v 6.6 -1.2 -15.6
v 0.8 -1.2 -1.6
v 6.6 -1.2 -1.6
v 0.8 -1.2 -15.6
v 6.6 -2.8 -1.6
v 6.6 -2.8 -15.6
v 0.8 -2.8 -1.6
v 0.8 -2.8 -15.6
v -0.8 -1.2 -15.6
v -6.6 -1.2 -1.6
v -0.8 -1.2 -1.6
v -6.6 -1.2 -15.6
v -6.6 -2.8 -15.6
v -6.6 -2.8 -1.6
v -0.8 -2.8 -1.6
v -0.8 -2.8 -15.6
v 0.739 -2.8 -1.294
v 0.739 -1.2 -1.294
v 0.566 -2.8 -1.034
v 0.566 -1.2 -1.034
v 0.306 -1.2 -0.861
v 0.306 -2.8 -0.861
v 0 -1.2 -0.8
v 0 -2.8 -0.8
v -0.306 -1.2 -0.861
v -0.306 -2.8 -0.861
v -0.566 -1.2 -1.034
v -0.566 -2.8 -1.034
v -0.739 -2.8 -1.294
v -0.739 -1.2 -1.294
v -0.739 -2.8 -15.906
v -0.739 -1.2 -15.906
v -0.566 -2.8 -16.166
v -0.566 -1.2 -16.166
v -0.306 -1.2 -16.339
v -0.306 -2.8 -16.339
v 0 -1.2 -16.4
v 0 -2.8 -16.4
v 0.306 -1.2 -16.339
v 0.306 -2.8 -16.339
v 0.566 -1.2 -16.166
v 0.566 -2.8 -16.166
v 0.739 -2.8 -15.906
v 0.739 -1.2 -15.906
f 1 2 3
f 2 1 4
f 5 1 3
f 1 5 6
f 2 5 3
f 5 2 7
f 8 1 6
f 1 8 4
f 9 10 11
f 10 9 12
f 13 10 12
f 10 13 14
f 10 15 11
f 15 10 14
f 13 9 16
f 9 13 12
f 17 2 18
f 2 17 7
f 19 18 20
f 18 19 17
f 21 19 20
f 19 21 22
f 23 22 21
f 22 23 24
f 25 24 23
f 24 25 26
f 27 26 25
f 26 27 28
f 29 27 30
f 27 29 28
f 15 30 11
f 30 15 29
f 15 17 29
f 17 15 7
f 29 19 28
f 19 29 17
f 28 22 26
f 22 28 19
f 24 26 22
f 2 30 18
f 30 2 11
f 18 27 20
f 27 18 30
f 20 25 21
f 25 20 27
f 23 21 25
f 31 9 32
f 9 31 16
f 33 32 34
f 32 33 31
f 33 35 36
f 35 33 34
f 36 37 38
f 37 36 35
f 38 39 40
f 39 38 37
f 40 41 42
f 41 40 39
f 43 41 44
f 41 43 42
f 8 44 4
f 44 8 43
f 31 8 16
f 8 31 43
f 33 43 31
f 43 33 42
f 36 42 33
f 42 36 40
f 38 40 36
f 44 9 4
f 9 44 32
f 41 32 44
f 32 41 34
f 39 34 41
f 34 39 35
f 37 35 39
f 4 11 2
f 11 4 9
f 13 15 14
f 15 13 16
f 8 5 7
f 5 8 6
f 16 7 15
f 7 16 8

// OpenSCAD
// file: ../p/4-4edge.scad
use <../lib.scad>
$fa=1; $fs=0.2;
function ldraw_lib__4_4edge(realsolid=false) = [
// 0 Circle 1.0
// 0 Name: 4-4edge.dat
// 0 Author: James Jessiman
// 0 !LDRAW_ORG Primitive UPDATE 2017-01
// 0 !LICENSE Licensed under CC BY 2.0 and CC BY 4.0 : see CAreadme.txt
// 
// 0 BFC CERTIFY CCW
  [0,"BFC","CERTIFY"],
  [0,"BFC","CCW"],
// 
// 0 !HISTORY 1998-12-15 [PTadmin] Official Update 1998-10
// 0 !HISTORY 2005-12-28 [PTadmin] Official Update 2005-01
// 0 !HISTORY 2007-06-24 [PTadmin] Header formatted for Contributor Agreement
// 0 !HISTORY 2008-07-01 [PTadmin] Official Update 2008-01
// 0 !HISTORY 2017-01-15 [Steffen] BFCed
// 0 !HISTORY 2017-12-30 [PTadmin] Official Update 2017-01
// 
// 
// 2 24 1 0 0 0.9239 0 0.3827
  [2,24,1,0,0,0.9239,0,0.3827],
// 2 24 0.9239 0 0.3827 0.7071 0 0.7071
  [2,24,0.9239,0,0.3827,0.7071,0,0.7071],
// 2 24 0.7071 0 0.7071 0.3827 0 0.9239
  [2,24,0.7071,0,0.7071,0.3827,0,0.9239],
// 2 24 0.3827 0 0.9239 0 0 1
  [2,24,0.3827,0,0.9239,0,0,1],
// 2 24 0 0 1 -0.3827 0 0.9239
  [2,24,0,0,1,-0.3827,0,0.9239],
// 2 24 -0.3827 0 0.9239 -0.7071 0 0.7071
  [2,24,-0.3827,0,0.9239,-0.7071,0,0.7071],
// 2 24 -0.7071 0 0.7071 -0.9239 0 0.3827
  [2,24,-0.7071,0,0.7071,-0.9239,0,0.3827],
// 2 24 -0.9239 0 0.3827 -1 0 -0
  [2,24,-0.9239,0,0.3827,-1,0,-0],
// 2 24 -1 0 -0 -0.9239 0 -0.3827
  [2,24,-1,0,-0,-0.9239,0,-0.3827],
// 2 24 -0.9239 0 -0.3827 -0.7071 0 -0.7071
  [2,24,-0.9239,0,-0.3827,-0.7071,0,-0.7071],
// 2 24 -0.7071 0 -0.7071 -0.3827 0 -0.9239
  [2,24,-0.7071,0,-0.7071,-0.3827,0,-0.9239],
// 2 24 -0.3827 0 -0.9239 0 0 -1
  [2,24,-0.3827,0,-0.9239,0,0,-1],
// 2 24 0 0 -1 0.3827 0 -0.9239
  [2,24,0,0,-1,0.3827,0,-0.9239],
// 2 24 0.3827 0 -0.9239 0.7071 0 -0.7071
  [2,24,0.3827,0,-0.9239,0.7071,0,-0.7071],
// 2 24 0.7071 0 -0.7071 0.9239 0 -0.3827
  [2,24,0.7071,0,-0.7071,0.9239,0,-0.3827],
// 2 24 0.9239 0 -0.3827 1 0 0
  [2,24,0.9239,0,-0.3827,1,0,0],
];
module ldraw_lib__4_4edge(step=0, col=false, unit=2/5, alt=false, line=0.2, solid=!$preview)
    makepoly(ldraw_lib__4_4edge(solid), step=step, col=col, unit=unit, alt=alt, line=line, solid=solid);
ldraw_lib__4_4edge(line=0.2);
// file: ../p/4-4disc.scad
use <../lib.scad>
$fa=1; $fs=0.2;
function ldraw_lib__4_4disc(realsolid=false) = [
// 0 Disc 1.0
// 0 Name: 4-4disc.dat
// 0 Author: James Jessiman
// 0 !LDRAW_ORG Primitive UPDATE 2002-02
// 0 !LICENSE Licensed under CC BY 2.0 and CC BY 4.0 : see CAreadme.txt
// 
// 0 BFC CERTIFY CCW
  [0,"BFC","CERTIFY"],
  [0,"BFC","CCW"],
// 
// 0 !HISTORY 1998-12-15 [PTadmin] Official Update 1998-10
// 0 !HISTORY 2002-03-23 [sbliss] Added BFC statement
// 0 !HISTORY 2002-04-25 [PTadmin] Official Update 2002-02
// 0 !HISTORY 2007-06-24 [PTadmin] Header formatted for Contributor Agreement
// 0 !HISTORY 2008-07-01 [PTadmin] Official Update 2008-01
// 
// 
// 3 16 0 0 0 1 0 0 0.9239 0 0.3827
  [3,16,0,0,0,1,0,0,0.9239,0,0.3827],
// 3 16 0 0 0 0.9239 0 0.3827 0.7071 0 0.7071
  [3,16,0,0,0,0.9239,0,0.3827,0.7071,0,0.7071],
// 3 16 0 0 0 0.7071 0 0.7071 0.3827 0 0.9239
  [3,16,0,0,0,0.7071,0,0.7071,0.3827,0,0.9239],
// 3 16 0 0 0 0.3827 0 0.9239 0 0 1
  [3,16,0,0,0,0.3827,0,0.9239,0,0,1],
// 3 16 0 0 0 0 0 1 -0.3827 0 0.9239
  [3,16,0,0,0,0,0,1,-0.3827,0,0.9239],
// 3 16 0 0 0 -0.3827 0 0.9239 -0.7071 0 0.7071
  [3,16,0,0,0,-0.3827,0,0.9239,-0.7071,0,0.7071],
// 3 16 0 0 0 -0.7071 0 0.7071 -0.9239 0 0.3827
  [3,16,0,0,0,-0.7071,0,0.7071,-0.9239,0,0.3827],
// 3 16 0 0 0 -0.9239 0 0.3827 -1 0 -0
  [3,16,0,0,0,-0.9239,0,0.3827,-1,0,-0],
// 3 16 0 0 0 -1 0 -0 -0.9239 0 -0.3827
  [3,16,0,0,0,-1,0,-0,-0.9239,0,-0.3827],
// 3 16 0 0 0 -0.9239 0 -0.3827 -0.7071 0 -0.7071
  [3,16,0,0,0,-0.9239,0,-0.3827,-0.7071,0,-0.7071],
// 3 16 0 0 0 -0.7071 0 -0.7071 -0.3827 0 -0.9239
  [3,16,0,0,0,-0.7071,0,-0.7071,-0.3827,0,-0.9239],
// 3 16 0 0 0 -0.3827 0 -0.9239 0 0 -1
  [3,16,0,0,0,-0.3827,0,-0.9239,0,0,-1],
// 3 16 0 0 0 0 0 -1 0.3827 0 -0.9239
  [3,16,0,0,0,0,0,-1,0.3827,0,-0.9239],
// 3 16 0 0 0 0.3827 0 -0.9239 0.7071 0 -0.7071
  [3,16,0,0,0,0.3827,0,-0.9239,0.7071,0,-0.7071],
// 3 16 0 0 0 0.7071 0 -0.7071 0.9239 0 -0.3827
  [3,16,0,0,0,0.7071,0,-0.7071,0.9239,0,-0.3827],
// 3 16 0 0 0 0.9239 0 -0.3827 1 0 0
  [3,16,0,0,0,0.9239,0,-0.3827,1,0,0],
// 0
];
module ldraw_lib__4_4disc(step=0, col=false, unit=2/5, alt=false, line=0.2, solid=!$preview)
    makepoly(ldraw_lib__4_4disc(solid), step=step, col=col, unit=unit, alt=alt, line=line, solid=solid);
ldraw_lib__4_4disc(line=0.2);
// file: ../p/4-4cyli.scad
use <../lib.scad>
$fa=1; $fs=0.2;
function ldraw_lib__4_4cyli(realsolid=false) = [
// 0 Cylinder 1.0
// 0 Name: 4-4cyli.dat
// 0 Author: James Jessiman
// 0 !LDRAW_ORG Primitive UPDATE 2005-01
// 0 !LICENSE Licensed under CC BY 2.0 and CC BY 4.0 : see CAreadme.txt
// 
// 0 BFC CERTIFY CCW
  [0,"BFC","CERTIFY"],
  [0,"BFC","CCW"],
// 
// 0 !HISTORY 1998-12-15 [PTadmin] Official Update 1998-10
// 0 !HISTORY 2002-03-23 [sbliss] Added BFC statement; merged headers from files in distributions LDraw 0.27 and Complete.
// 0 !HISTORY 2002-04-25 [PTadmin] Official Update 2002-02
// 0 !HISTORY 2004-12-14 [guyvivan] BFC CCW
// 0 !HISTORY 2005-12-28 [PTadmin] Official Update 2005-01
// 0 !HISTORY 2007-06-24 [PTadmin] Header formatted for Contributor Agreement
// 0 !HISTORY 2008-07-01 [PTadmin] Official Update 2008-01
// 
// 
// 4 16 1 1 0 0.9239 1 0.3827 0.9239 0 0.3827 1 0 0
  [4,16,1,1,0,0.9239,1,0.3827,0.9239,0,0.3827,1,0,0],
// 5 24 1 0 0 1 1 0 0.9239 0 0.3827 0.9239 0 -0.3827
  [5,24,1,0,0,1,1,0,0.9239,0,0.3827,0.9239,0,-0.3827],
// 4 16 0.9239 1 0.3827 0.7071 1 0.7071 0.7071 0 0.7071 0.9239 0 0.3827
  [4,16,0.9239,1,0.3827,0.7071,1,0.7071,0.7071,0,0.7071,0.9239,0,0.3827],
// 5 24 0.9239 0 0.3827 0.9239 1 0.3827 0.7071 0 0.7071 1 0 0
  [5,24,0.9239,0,0.3827,0.9239,1,0.3827,0.7071,0,0.7071,1,0,0],
// 4 16 0.7071 1 0.7071 0.3827 1 0.9239 0.3827 0 0.9239 0.7071 0 0.7071
  [4,16,0.7071,1,0.7071,0.3827,1,0.9239,0.3827,0,0.9239,0.7071,0,0.7071],
// 5 24 0.7071 0 0.7071 0.7071 1 0.7071 0.3827 0 0.9239 0.9239 0 0.3827
  [5,24,0.7071,0,0.7071,0.7071,1,0.7071,0.3827,0,0.9239,0.9239,0,0.3827],
// 4 16 0.3827 1 0.9239 0 1 1 0 0 1 0.3827 0 0.9239
  [4,16,0.3827,1,0.9239,0,1,1,0,0,1,0.3827,0,0.9239],
// 5 24 0.3827 0 0.9239 0.3827 1 0.9239 0 0 1 0.7071 0 0.7071
  [5,24,0.3827,0,0.9239,0.3827,1,0.9239,0,0,1,0.7071,0,0.7071],
// 4 16 0 1 1 -0.3827 1 0.9239 -0.3827 0 0.9239 0 0 1
  [4,16,0,1,1,-0.3827,1,0.9239,-0.3827,0,0.9239,0,0,1],
// 5 24 0 0 1 0 1 1 -0.3827 0 0.9239 0.3827 0 0.9239
  [5,24,0,0,1,0,1,1,-0.3827,0,0.9239,0.3827,0,0.9239],
// 4 16 -0.3827 1 0.9239 -0.7071 1 0.7071 -0.7071 0 0.7071 -0.3827 0 0.9239
  [4,16,-0.3827,1,0.9239,-0.7071,1,0.7071,-0.7071,0,0.7071,-0.3827,0,0.9239],
// 5 24 -0.3827 0 0.9239 -0.3827 1 0.9239 -0.7071 0 0.7071 0 0 1
  [5,24,-0.3827,0,0.9239,-0.3827,1,0.9239,-0.7071,0,0.7071,0,0,1],
// 4 16 -0.7071 1 0.7071 -0.9239 1 0.3827 -0.9239 0 0.3827 -0.7071 0 0.7071
  [4,16,-0.7071,1,0.7071,-0.9239,1,0.3827,-0.9239,0,0.3827,-0.7071,0,0.7071],
// 5 24 -0.7071 0 0.7071 -0.7071 1 0.7071 -0.9239 0 0.3827 -0.3827 0 0.9239
  [5,24,-0.7071,0,0.7071,-0.7071,1,0.7071,-0.9239,0,0.3827,-0.3827,0,0.9239],
// 4 16 -0.9239 1 0.3827 -1 1 0 -1 0 0 -0.9239 0 0.3827
  [4,16,-0.9239,1,0.3827,-1,1,0,-1,0,0,-0.9239,0,0.3827],
// 5 24 -0.9239 0 0.3827 -0.9239 1 0.3827 -1 0 0 -0.7071 0 0.7071
  [5,24,-0.9239,0,0.3827,-0.9239,1,0.3827,-1,0,0,-0.7071,0,0.7071],
// 4 16 -1 1 0 -0.9239 1 -0.3827 -0.9239 0 -0.3827 -1 0 0
  [4,16,-1,1,0,-0.9239,1,-0.3827,-0.9239,0,-0.3827,-1,0,0],
// 5 24 -1 0 0 -1 1 0 -0.9239 0 -0.3827 -0.9239 0 0.3827
  [5,24,-1,0,0,-1,1,0,-0.9239,0,-0.3827,-0.9239,0,0.3827],
// 4 16 -0.9239 1 -0.3827 -0.7071 1 -0.7071 -0.7071 0 -0.7071 -0.9239 0 -0.3827
  [4,16,-0.9239,1,-0.3827,-0.7071,1,-0.7071,-0.7071,0,-0.7071,-0.9239,0,-0.3827],
// 5 24 -0.9239 0 -0.3827 -0.9239 1 -0.3827 -0.7071 0 -0.7071 -1 0 0
  [5,24,-0.9239,0,-0.3827,-0.9239,1,-0.3827,-0.7071,0,-0.7071,-1,0,0],
// 4 16 -0.7071 1 -0.7071 -0.3827 1 -0.9239 -0.3827 0 -0.9239 -0.7071 0 -0.7071
  [4,16,-0.7071,1,-0.7071,-0.3827,1,-0.9239,-0.3827,0,-0.9239,-0.7071,0,-0.7071],
// 5 24 -0.7071 0 -0.7071 -0.7071 1 -0.7071 -0.3827 0 -0.9239 -0.9239 0 -0.3827
  [5,24,-0.7071,0,-0.7071,-0.7071,1,-0.7071,-0.3827,0,-0.9239,-0.9239,0,-0.3827],
// 4 16 -0.3827 1 -0.9239 0 1 -1 0 0 -1 -0.3827 0 -0.9239
  [4,16,-0.3827,1,-0.9239,0,1,-1,0,0,-1,-0.3827,0,-0.9239],
// 5 24 -0.3827 0 -0.9239 -0.3827 1 -0.9239 0 0 -1 -0.7071 0 -0.7071
  [5,24,-0.3827,0,-0.9239,-0.3827,1,-0.9239,0,0,-1,-0.7071,0,-0.7071],
// 4 16 0 1 -1 0.3827 1 -0.9239 0.3827 0 -0.9239 0 0 -1
  [4,16,0,1,-1,0.3827,1,-0.9239,0.3827,0,-0.9239,0,0,-1],
// 5 24 0 0 -1 0 1 -1 0.3827 0 -0.9239 -0.3827 0 -0.9239
  [5,24,0,0,-1,0,1,-1,0.3827,0,-0.9239,-0.3827,0,-0.9239],
// 4 16 0.3827 1 -0.9239 0.7071 1 -0.7071 0.7071 0 -0.7071 0.3827 0 -0.9239
  [4,16,0.3827,1,-0.9239,0.7071,1,-0.7071,0.7071,0,-0.7071,0.3827,0,-0.9239],
// 5 24 0.3827 0 -0.9239 0.3827 1 -0.9239 0.7071 0 -0.7071 0 0 -1
  [5,24,0.3827,0,-0.9239,0.3827,1,-0.9239,0.7071,0,-0.7071,0,0,-1],
// 4 16 0.7071 1 -0.7071 0.9239 1 -0.3827 0.9239 0 -0.3827 0.7071 0 -0.7071
  [4,16,0.7071,1,-0.7071,0.9239,1,-0.3827,0.9239,0,-0.3827,0.7071,0,-0.7071],
// 5 24 0.7071 0 -0.7071 0.7071 1 -0.7071 0.9239 0 -0.3827 0.3827 0 -0.9239
  [5,24,0.7071,0,-0.7071,0.7071,1,-0.7071,0.9239,0,-0.3827,0.3827,0,-0.9239],
// 4 16 0.9239 1 -0.3827 1 1 0 1 0 0 0.9239 0 -0.3827
  [4,16,0.9239,1,-0.3827,1,1,0,1,0,0,0.9239,0,-0.3827],
// 5 24 0.9239 0 -0.3827 0.9239 1 -0.3827 1 0 0 0.7071 0 -0.7071
  [5,24,0.9239,0,-0.3827,0.9239,1,-0.3827,1,0,0,0.7071,0,-0.7071],
// 0
];
module ldraw_lib__4_4cyli(step=0, col=false, unit=2/5, alt=false, line=0.2, solid=!$preview)
    makepoly(ldraw_lib__4_4cyli(solid), step=step, col=col, unit=unit, alt=alt, line=line, solid=solid);
ldraw_lib__4_4cyli(line=0.2);
// file: ../p/2-4edge.scad
use <../lib.scad>
$fa=1; $fs=0.2;
function ldraw_lib__2_4edge(realsolid=false) = [
// 0 Circle 0.5
// 0 Name: 2-4edge.dat
// 0 Author: James Jessiman
// 0 !LDRAW_ORG Primitive UPDATE 2017-01
// 0 !LICENSE Licensed under CC BY 2.0 and CC BY 4.0 : see CAreadme.txt
// 
// 0 BFC CERTIFY CCW
  [0,"BFC","CERTIFY"],
  [0,"BFC","CCW"],
// 
// 0 !HISTORY 2007-06-24 [PTadmin] Header formatted for Contributor Agreement
// 0 !HISTORY 2008-07-01 [PTadmin] Official Update 2008-01
// 0 !HISTORY 2017-01-15 [Steffen] BFCed
// 0 !HISTORY 2017-12-30 [PTadmin] Official Update 2017-01
// 
// 
// 2 24 1 0 0 0.9239 0 0.3827
  [2,24,1,0,0,0.9239,0,0.3827],
// 2 24 0.9239 0 0.3827 0.7071 0 0.7071
  [2,24,0.9239,0,0.3827,0.7071,0,0.7071],
// 2 24 0.7071 0 0.7071 0.3827 0 0.9239
  [2,24,0.7071,0,0.7071,0.3827,0,0.9239],
// 2 24 0.3827 0 0.9239 0 0 1
  [2,24,0.3827,0,0.9239,0,0,1],
// 2 24 0 0 1 -0.3827 0 0.9239
  [2,24,0,0,1,-0.3827,0,0.9239],
// 2 24 -0.3827 0 0.9239 -0.7071 0 0.7071
  [2,24,-0.3827,0,0.9239,-0.7071,0,0.7071],
// 2 24 -0.7071 0 0.7071 -0.9239 0 0.3827
  [2,24,-0.7071,0,0.7071,-0.9239,0,0.3827],
// 2 24 -0.9239 0 0.3827 -1 0 0
  [2,24,-0.9239,0,0.3827,-1,0,0],
];
module ldraw_lib__2_4edge(step=0, col=false, unit=2/5, alt=false, line=0.2, solid=!$preview)
    makepoly(ldraw_lib__2_4edge(solid), step=step, col=col, unit=unit, alt=alt, line=line, solid=solid);
ldraw_lib__2_4edge(line=0.2);
// file: ../p/2-4cyli.scad
use <../lib.scad>
$fa=1; $fs=0.2;
function ldraw_lib__2_4cyli(realsolid=false) = [
// 0 Cylinder 0.5
// 0 Name: 2-4cyli.dat
// 0 Author: James Jessiman
// 0 !LDRAW_ORG Primitive UPDATE 2005-01
// 0 !LICENSE Licensed under CC BY 2.0 and CC BY 4.0 : see CAreadme.txt
// 
// 0 BFC CERTIFY CCW
  [0,"BFC","CERTIFY"],
  [0,"BFC","CCW"],
// 
// 0 !HISTORY 2002-03-23 [sbliss] Added BFC statement; compacted code
// 0 !HISTORY 2002-04-25 [PTadmin] Official Update 2002-02
// 0 !HISTORY 2004-12-11 [nielsk] Recreated using Primitive Generator, Edge lines fixed, BFC changed to CCW
// 0 !HISTORY 2005-12-28 [PTadmin] Official Update 2005-01
// 0 !HISTORY 2007-06-24 [PTadmin] Header formatted for Contributor Agreement
// 0 !HISTORY 2008-07-01 [PTadmin] Official Update 2008-01
// 
// 
// 4 16 .9239 1 .3827 .9239 0 .3827 1 0 0 1 1 0
  [4,16,.9239,1,.3827,.9239,0,.3827,1,0,0,1,1,0],
// 4 16 .7071 1 .7071 .7071 0 .7071 .9239 0 .3827 .9239 1 .3827
  [4,16,.7071,1,.7071,.7071,0,.7071,.9239,0,.3827,.9239,1,.3827],
// 4 16 .3827 1 .9239 .3827 0 .9239 .7071 0 .7071 .7071 1 .7071
  [4,16,.3827,1,.9239,.3827,0,.9239,.7071,0,.7071,.7071,1,.7071],
// 4 16 0 1 1 0 0 1 .3827 0 .9239 .3827 1 .9239
  [4,16,0,1,1,0,0,1,.3827,0,.9239,.3827,1,.9239],
// 4 16 -.3827 1 .9239 -.3827 0 .9239 0 0 1 0 1 1
  [4,16,-.3827,1,.9239,-.3827,0,.9239,0,0,1,0,1,1],
// 4 16 -.7071 1 .7071 -.7071 0 .7071 -.3827 0 .9239 -.3827 1 .9239
  [4,16,-.7071,1,.7071,-.7071,0,.7071,-.3827,0,.9239,-.3827,1,.9239],
// 4 16 -.9239 1 .3827 -.9239 0 .3827 -.7071 0 .7071 -.7071 1 .7071
  [4,16,-.9239,1,.3827,-.9239,0,.3827,-.7071,0,.7071,-.7071,1,.7071],
// 4 16 -1 1 0 -1 0 0 -.9239 0 .3827 -.9239 1 .3827
  [4,16,-1,1,0,-1,0,0,-.9239,0,.3827,-.9239,1,.3827],
// 5 24 1 1 0 1 0 0 1 1 -.4142 .9239 1 .3827
  [5,24,1,1,0,1,0,0,1,1,-.4142,.9239,1,.3827],
// 5 24 .9239 1 .3827 .9239 0 .3827 1 1 0 .7071 1 .7071
  [5,24,.9239,1,.3827,.9239,0,.3827,1,1,0,.7071,1,.7071],
// 5 24 .7071 1 .7071 .7071 0 .7071 .9239 1 .3827 .3827 1 .9239
  [5,24,.7071,1,.7071,.7071,0,.7071,.9239,1,.3827,.3827,1,.9239],
// 5 24 .3827 1 .9239 .3827 0 .9239 .7071 1 .7071 0 1 1
  [5,24,.3827,1,.9239,.3827,0,.9239,.7071,1,.7071,0,1,1],
// 5 24 0 1 1 0 0 1 .3827 1 .9239 -.3827 1 .9239
  [5,24,0,1,1,0,0,1,.3827,1,.9239,-.3827,1,.9239],
// 5 24 -.3827 1 .9239 -.3827 0 .9239 0 1 1 -.7071 1 .7071
  [5,24,-.3827,1,.9239,-.3827,0,.9239,0,1,1,-.7071,1,.7071],
// 5 24 -.7071 1 .7071 -.7071 0 .7071 -.3827 1 .9239 -.9239 1 .3827
  [5,24,-.7071,1,.7071,-.7071,0,.7071,-.3827,1,.9239,-.9239,1,.3827],
// 5 24 -.9239 1 .3827 -.9239 0 .3827 -.7071 1 .7071 -1 1 0
  [5,24,-.9239,1,.3827,-.9239,0,.3827,-.7071,1,.7071,-1,1,0],
// 5 24 -1 1 0 -1 0 0 -.9239 1 .3827 -1 1 -.4142
  [5,24,-1,1,0,-1,0,0,-.9239,1,.3827,-1,1,-.4142],
// 0
];
module ldraw_lib__2_4cyli(step=0, col=false, unit=2/5, alt=false, line=0.2, solid=!$preview)
    makepoly(ldraw_lib__2_4cyli(solid), step=step, col=col, unit=unit, alt=alt, line=line, solid=solid);
ldraw_lib__2_4cyli(line=0.2);
// file: ../p/stud3.scad
use <../lib.scad>
use <4-4cyli.scad>
use <4-4disc.scad>
use <4-4edge.scad>
$fa=1; $fs=0.2;
function ldraw_lib__stud3(realsolid=false) = realsolid ? 
    [openscad(translate([0,0,-eps()], o=cylinder(4+eps(), r=4)),2)] : [
// 0 Stud Tube Solid
// 0 Name: stud3.dat
// 0 Author: James Jessiman
// 0 !LDRAW_ORG Primitive UPDATE 2012-01
// 0 !LICENSE Licensed under CC BY 2.0 and CC BY 4.0 : see CAreadme.txt
// 
// 0 BFC CERTIFY CCW
  [0,"BFC","CERTIFY"],
  [0,"BFC","CCW"],
// 
// 0 !HISTORY 2002-04-04 [sbliss] Modified for BFC compliance
// 0 !HISTORY 2002-04-25 [PTadmin] Official Update 2002-02
// 0 !HISTORY 2007-06-24 [PTadmin] Header formatted for Contributor Agreement
// 0 !HISTORY 2008-07-01 [PTadmin] Official Update 2008-01
// 0 !HISTORY 2012-02-16 [Philo] Changed to CCW
// 0 !HISTORY 2012-03-30 [PTadmin] Official Update 2012-01
// 
// 
// 1 16 0 -4 0 4 0 0 0 1 0 0 0 4 4-4edge.dat
  [1,16,0,-4,0,4,0,0,0,1,0,0,0,4, ldraw_lib__4_4edge(realsolid)],
// 1 16 0 0 0 4 0 0 0 1 0 0 0 4 4-4edge.dat
  [1,16,0,0,0,4,0,0,0,1,0,0,0,4, ldraw_lib__4_4edge(realsolid)],
// 1 16 0 -4 0 4 0 0 0 1 0 0 0 4 4-4disc.dat
  [1,16,0,-4,0,4,0,0,0,1,0,0,0,4, ldraw_lib__4_4disc(realsolid)],
// 1 16 0 -4 0 4 0 0 0 4 0 0 0 4 4-4cyli.dat
  [1,16,0,-4,0,4,0,0,0,4,0,0,0,4, ldraw_lib__4_4cyli(realsolid)],
];
module ldraw_lib__stud3(step=0, col=false, unit=2/5, alt=false, line=0.2, solid=!$preview)
    makepoly(ldraw_lib__stud3(solid), step=step, col=col, unit=unit, alt=alt, line=line, solid=solid);
ldraw_lib__stud3(line=0.2);
// file: ../p/stud.scad
use <../lib.scad>
use <4-4cyli.scad>
use <4-4disc.scad>
use <4-4edge.scad>
$fa=1; $fs=0.2;
function ldraw_lib__stud(realsolid=false) = realsolid ? 
    [openscad(translate([0,0,-eps()], o=cylinder(4+eps(), r=6)),2)] : [
// 0 Stud
// 0 Name: stud.dat
// 0 Author: James Jessiman
// 0 !LDRAW_ORG Primitive UPDATE 2012-01
// 0 !LICENSE Licensed under CC BY 2.0 and CC BY 4.0 : see CAreadme.txt
// 
// 0 BFC CERTIFY CCW
  [0,"BFC","CERTIFY"],
  [0,"BFC","CCW"],
// 
// 0 !HISTORY 2002-04-04 [sbliss] Modified for BFC compliance
// 0 !HISTORY 2002-04-25 [PTadmin] Official Update 2002-02
// 0 !HISTORY 2007-06-24 [PTadmin] Header formatted for Contributor Agreement
// 0 !HISTORY 2008-07-01 [PTadmin] Official Update 2008-01
// 0 !HISTORY 2012-02-16 [Philo] Changed to CCW
// 0 !HISTORY 2012-03-30 [PTadmin] Official Update 2012-01
// 
// 
// 1 16 0 0 0 6 0 0 0 1 0 0 0 6 4-4edge.dat
  [1,16,0,0,0,6,0,0,0,1,0,0,0,6, ldraw_lib__4_4edge(realsolid)],
// 1 16 0 -4 0 6 0 0 0 1 0 0 0 6 4-4edge.dat
  [1,16,0,-4,0,6,0,0,0,1,0,0,0,6, ldraw_lib__4_4edge(realsolid)],
// 1 16 0 0 0 6 0 0 0 -4 0 0 0 6 4-4cyli.dat
  [1,16,0,0,0,6,0,0,0,-4,0,0,0,6, ldraw_lib__4_4cyli(realsolid)],
// 1 16 0 -4 0 6 0 0 0 1 0 0 0 6 4-4disc.dat
  [1,16,0,-4,0,6,0,0,0,1,0,0,0,6, ldraw_lib__4_4disc(realsolid)],
];
module ldraw_lib__stud(step=0, col=false, unit=2/5, alt=false, line=0.2, solid=!$preview)
    makepoly(ldraw_lib__stud(solid), step=step, col=col, unit=unit, alt=alt, line=line, solid=solid);
ldraw_lib__stud(line=0.2);
// file: ../p/box5.scad
use <../lib.scad>
$fa=1; $fs=0.2;
function ldraw_lib__box5(realsolid=false) = [
// 0 Box with 5 Faces and All Edges
// 0 Name: box5.dat
// 0 Author: James Jessiman
// 0 !LDRAW_ORG Primitive UPDATE 2012-01
// 0 !LICENSE Licensed under CC BY 2.0 and CC BY 4.0 : see CAreadme.txt
// 
// 0 BFC CERTIFY CCW
  [0,"BFC","CERTIFY"],
  [0,"BFC","CCW"],
// 
// 0 !HISTORY 2002-04-03 [sbliss] Modified for BFC compliance
// 0 !HISTORY 2002-04-25 [PTadmin] Official Update 2002-02
// 0 !HISTORY 2007-06-24 [PTadmin] Header formatted for Contributor Agreement
// 0 !HISTORY 2008-07-01 [PTadmin] Official Update 2008-01
// 0 !HISTORY 2012-02-16 [Philo] Changed to CCW
// 0 !HISTORY 2012-03-30 [PTadmin] Official Update 2012-01
// 
// 
// 2 24 1 1 1 -1 1 1
  [2,24,1,1,1,-1,1,1],
// 2 24 -1 1 1 -1 1 -1
  [2,24,-1,1,1,-1,1,-1],
// 2 24 -1 1 -1 1 1 -1
  [2,24,-1,1,-1,1,1,-1],
// 2 24 1 1 -1 1 1 1
  [2,24,1,1,-1,1,1,1],
// 2 24 1 0 1 -1 0 1
  [2,24,1,0,1,-1,0,1],
// 2 24 -1 0 1 -1 0 -1
  [2,24,-1,0,1,-1,0,-1],
// 2 24 -1 0 -1 1 0 -1
  [2,24,-1,0,-1,1,0,-1],
// 2 24 1 0 -1 1 0 1
  [2,24,1,0,-1,1,0,1],
// 2 24 1 0 1 1 1 1
  [2,24,1,0,1,1,1,1],
// 2 24 -1 0 1 -1 1 1
  [2,24,-1,0,1,-1,1,1],
// 2 24 1 0 -1 1 1 -1
  [2,24,1,0,-1,1,1,-1],
// 2 24 -1 0 -1 -1 1 -1
  [2,24,-1,0,-1,-1,1,-1],
// 4 16 -1 1 1 1 1 1 1 1 -1 -1 1 -1
  [4,16,-1,1,1,1,1,1,1,1,-1,-1,1,-1],
// 4 16 -1 1 1 -1 0 1 1 0 1 1 1 1
  [4,16,-1,1,1,-1,0,1,1,0,1,1,1,1],
// 4 16 -1 1 -1 -1 0 -1 -1 0 1 -1 1 1
  [4,16,-1,1,-1,-1,0,-1,-1,0,1,-1,1,1],
// 4 16 1 1 -1 1 0 -1 -1 0 -1 -1 1 -1
  [4,16,1,1,-1,1,0,-1,-1,0,-1,-1,1,-1],
// 4 16 1 1 1 1 0 1 1 0 -1 1 1 -1
  [4,16,1,1,1,1,0,1,1,0,-1,1,1,-1],
];
module ldraw_lib__box5(step=0, col=false, unit=2/5, alt=false, line=0.2, solid=!$preview)
    makepoly(ldraw_lib__box5(solid), step=step, col=col, unit=unit, alt=alt, line=line, solid=solid);
ldraw_lib__box5(line=0.2);
// file: ../p/box4t.scad
use <../lib.scad>
$fa=1; $fs=0.2;
function ldraw_lib__box4t(realsolid=false) = [
// 0 Box with 4 Adjacent Faces and All Edges
// 0 Name: box4t.dat
// 0 Author: Tore Eriksson [Tore_Eriksson]
// 0 !LDRAW_ORG Primitive UPDATE 2003-02
// 0 !LICENSE Licensed under CC BY 2.0 and CC BY 4.0 : see CAreadme.txt
// 
// 0 BFC CERTIFY CCW
  [0,"BFC","CERTIFY"],
  [0,"BFC","CCW"],
// 
// 0 !HISTORY 1997-09-29 [PTadmin] Official Update 1997-15
// 0 !HISTORY 2002-08-31 [izanette] Modified with WINDZ for BFC compliance
// 0 !HISTORY 2003-08-01 [PTadmin] Official Update 2003-02
// 0 !HISTORY 2007-06-24 [PTadmin] Header formatted for Contributor Agreement
// 0 !HISTORY 2008-07-01 [PTadmin] Official Update 2008-01
// 
// 
// 2 24 1 1 1 -1 1 1
  [2,24,1,1,1,-1,1,1],
// 2 24 -1 1 1 -1 1 -1
  [2,24,-1,1,1,-1,1,-1],
// 2 24 -1 1 -1 1 1 -1
  [2,24,-1,1,-1,1,1,-1],
// 2 24 1 1 -1 1 1 1
  [2,24,1,1,-1,1,1,1],
// 2 24 1 0 1 -1 0 1
  [2,24,1,0,1,-1,0,1],
// 2 24 -1 0 1 -1 0 -1
  [2,24,-1,0,1,-1,0,-1],
// 2 24 -1 0 -1 1 0 -1
  [2,24,-1,0,-1,1,0,-1],
// 2 24 1 0 -1 1 0 1
  [2,24,1,0,-1,1,0,1],
// 2 24 1 0 1 1 1 1
  [2,24,1,0,1,1,1,1],
// 2 24 -1 0 1 -1 1 1
  [2,24,-1,0,1,-1,1,1],
// 2 24 1 0 -1 1 1 -1
  [2,24,1,0,-1,1,1,-1],
// 2 24 -1 0 -1 -1 1 -1
  [2,24,-1,0,-1,-1,1,-1],
// 4 16 1 1 1 1 1 -1 -1 1 -1 -1 1 1
  [4,16,1,1,1,1,1,-1,-1,1,-1,-1,1,1],
// 4 16 1 1 1 -1 1 1 -1 0 1 1 0 1
  [4,16,1,1,1,-1,1,1,-1,0,1,1,0,1],
// 4 16 -1 1 1 -1 1 -1 -1 0 -1 -1 0 1
  [4,16,-1,1,1,-1,1,-1,-1,0,-1,-1,0,1],
// 0 4 16 -1 1 -1 -1 0 -1 1 0 -1 1 1 -1
// 4 16 1 1 -1 1 1 1 1 0 1 1 0 -1
  [4,16,1,1,-1,1,1,1,1,0,1,1,0,-1],
// 0
];
module ldraw_lib__box4t(step=0, col=false, unit=2/5, alt=false, line=0.2, solid=!$preview)
    makepoly(ldraw_lib__box4t(solid), step=step, col=col, unit=unit, alt=alt, line=line, solid=solid);
ldraw_lib__box4t(line=0.2);
// file: ../p/box4-4a.scad
use <../lib.scad>
$fa=1; $fs=0.2;
function ldraw_lib__box4_4a(realsolid=false) = [
// 0 Box with 4 Faces without 4 Adjacent Edges
// 0 Name: box4-4a.dat
// 0 Author: Manfred Moolhuysen
// 0 !LDRAW_ORG Primitive UPDATE 2012-01
// 0 !LICENSE Licensed under CC BY 2.0 and CC BY 4.0 : see CAreadme.txt
// 
// 0 BFC CERTIFY CCW
  [0,"BFC","CERTIFY"],
  [0,"BFC","CCW"],
// 
// 0 !HISTORY 1998-07-15 [PTadmin] Official Update 1998-07
// 0 !HISTORY 2002-12-13 [hafhead] Made BFC compliant
// 0 !HISTORY 2003-03-12 [PTadmin] Official Update 2003-01
// 0 !HISTORY 2007-06-24 [PTadmin] Header formatted for Contributor Agreement
// 0 !HISTORY 2008-07-01 [PTadmin] Official Update 2008-01
// 0 !HISTORY 2012-02-16 [Philo] Changed to CCW
// 0 !HISTORY 2012-03-30 [PTadmin] Official Update 2012-01
// 
// 
// 2 24 1 1 1 -1 1 1
  [2,24,1,1,1,-1,1,1],
// 2 24 -1 1 1 -1 1 -1
  [2,24,-1,1,1,-1,1,-1],
// 2 24 1 1 -1 1 1 1
  [2,24,1,1,-1,1,1,1],
// 2 24 1 0 1 -1 0 1
  [2,24,1,0,1,-1,0,1],
// 2 24 -1 0 1 -1 0 -1
  [2,24,-1,0,1,-1,0,-1],
// 2 24 1 0 -1 1 0 1
  [2,24,1,0,-1,1,0,1],
// 2 24 1 0 1 1 1 1
  [2,24,1,0,1,1,1,1],
// 2 24 -1 0 1 -1 1 1
  [2,24,-1,0,1,-1,1,1],
// 4 16 1 1 -1 -1 1 -1 -1 1 1 1 1 1
  [4,16,1,1,-1,-1,1,-1,-1,1,1,1,1,1],
// 4 16 -1 1 1 -1 0 1 1 0 1 1 1 1
  [4,16,-1,1,1,-1,0,1,1,0,1,1,1,1],
// 4 16 -1 1 -1 -1 0 -1 -1 0 1 -1 1 1
  [4,16,-1,1,-1,-1,0,-1,-1,0,1,-1,1,1],
// 4 16 1 1 1 1 0 1 1 0 -1 1 1 -1
  [4,16,1,1,1,1,0,1,1,0,-1,1,1,-1],
];
module ldraw_lib__box4_4a(step=0, col=false, unit=2/5, alt=false, line=0.2, solid=!$preview)
    makepoly(ldraw_lib__box4_4a(solid), step=step, col=col, unit=unit, alt=alt, line=line, solid=solid);
ldraw_lib__box4_4a(line=0.2);
// file: ../p/2-4cylo.scad
use <../lib.scad>
use <2-4cyli.scad>
use <2-4edge.scad>
$fa=1; $fs=0.2;
function ldraw_lib__2_4cylo(realsolid=false) = [
// 0 Cylinder Open 0.5
// 0 Name: 2-4cylo.dat
// 0 Author: Max Martin Richter [MMR1988]
// 0 !LDRAW_ORG Primitive UPDATE 2010-03
// 0 !LICENSE Licensed under CC BY 2.0 and CC BY 4.0 : see CAreadme.txt
// 
// 0 BFC CERTIFY CCW
  [0,"BFC","CERTIFY"],
  [0,"BFC","CCW"],
// 
// 0 !HISTORY 2010-12-31 [PTadmin] Official Update 2010-03
// 
// 
// 1 16 0 0 0 1 0 0 0 1 0 0 0 1 2-4edge.dat
  [1,16,0,0,0,1,0,0,0,1,0,0,0,1, ldraw_lib__2_4edge(realsolid)],
// 1 16 0 1 0 1 0 0 0 1 0 0 0 1 2-4edge.dat
  [1,16,0,1,0,1,0,0,0,1,0,0,0,1, ldraw_lib__2_4edge(realsolid)],
// 1 16 0 0 0 1 0 0 0 1 0 0 0 1 2-4cyli.dat
  [1,16,0,0,0,1,0,0,0,1,0,0,0,1, ldraw_lib__2_4cyli(realsolid)],
];
module ldraw_lib__2_4cylo(step=0, col=false, unit=2/5, alt=false, line=0.2, solid=!$preview)
    makepoly(ldraw_lib__2_4cylo(solid), step=step, col=col, unit=unit, alt=alt, line=line, solid=solid);
ldraw_lib__2_4cylo(line=0.2);
// file: ../p/2-4chrd.scad
use <../lib.scad>
$fa=1; $fs=0.2;
function ldraw_lib__2_4chrd(realsolid=false) = [
// 0 Chord 0.5
// 0 Name: 2-4chrd.dat
// 0 Author: Philippe Hurbain [Philo]
// 0 !LDRAW_ORG Primitive UPDATE 2014-01
// 0 !LICENSE Licensed under CC BY 2.0 and CC BY 4.0 : see CAreadme.txt
// 
// 0 BFC CERTIFY CCW
  [0,"BFC","CERTIFY"],
  [0,"BFC","CCW"],
// 
// 0 !HISTORY 2014-06-21 [PTadmin] Official Update 2014-01
// 
// 
// 4 16 0.9239 0 0.3827 -0.9239 0 0.3827 -1 0 0 1 0 0
  [4,16,0.9239,0,0.3827,-0.9239,0,0.3827,-1,0,0,1,0,0],
// 4 16 0.7071 0 0.7071 -0.7071 0 0.7071 -0.9239 0 0.3827 0.9239 0 0.3827
  [4,16,0.7071,0,0.7071,-0.7071,0,0.7071,-0.9239,0,0.3827,0.9239,0,0.3827],
// 4 16 0.3827 0 0.9239 -0.3827 0 0.9239 -0.7071 0 0.7071 0.7071 0 0.7071
  [4,16,0.3827,0,0.9239,-0.3827,0,0.9239,-0.7071,0,0.7071,0.7071,0,0.7071],
// 3 16 0 0 1 -0.3827 0 0.9239 0.3827 0 0.9239
  [3,16,0,0,1,-0.3827,0,0.9239,0.3827,0,0.9239],
];
module ldraw_lib__2_4chrd(step=0, col=false, unit=2/5, alt=false, line=0.2, solid=!$preview)
    makepoly(ldraw_lib__2_4chrd(solid), step=step, col=col, unit=unit, alt=alt, line=line, solid=solid);
ldraw_lib__2_4chrd(line=0.2);
// file: s/3004s01.scad
use <../../lib.scad>
use <../../p/box4t.scad>
use <../../p/box5.scad>
use <../../p/stud.scad>
use <../../p/stud3.scad>
$fa=1; $fs=0.2;
function ldraw_lib__s__3004s01(realsolid=false) = [
// 0 ~Brick  1 x  2 without Front Face
// 0 Name: s\3004s01.dat
// 0 Author: James Jessiman
// 0 !LDRAW_ORG Subpart UPDATE 2003-03
// 0 !LICENSE Licensed under CC BY 2.0 and CC BY 4.0 : see CAreadme.txt
// 
// 0 BFC CERTIFY CCW
  [0,"BFC","CERTIFY"],
  [0,"BFC","CCW"],
// 
// 0 !HISTORY 2003-09-07 [jriley] Subfiling, BFC
// 0 !HISTORY 2003-12-19 [PTadmin] Official Update 2003-03
// 0 !HISTORY 2007-08-29 [PTadmin] Header formatted for Contributor Agreement
// 0 !HISTORY 2008-07-01 [PTadmin] Official Update 2008-01
// 
// 
// 1 16 0 4 0 1 0 0 0 -5 0 0 0 1 stud3.dat
  [1,16,0,4,0,1,0,0,0,-5,0,0,0,1, ldraw_lib__stud3(realsolid)],
// 0 BFC INVERTNEXT
  [0,"BFC","INVERTNEXT"],
// 1 16 0 24 0 16 0 0 0 -20 0 0 0 6 box5.dat
  [1,16,0,24,0,16,0,0,0,-20,0,0,0,6, ldraw_lib__box5(realsolid)],
// 4 16 20 24 10 16 24 6 -16 24 6 -20 24 10
  [4,16,20,24,10,16,24,6,-16,24,6,-20,24,10],
// 4 16 -20 24 10 -16 24 6 -16 24 -6 -20 24 -10
  [4,16,-20,24,10,-16,24,6,-16,24,-6,-20,24,-10],
// 4 16 -20 24 -10 -16 24 -6 16 24 -6 20 24 -10
  [4,16,-20,24,-10,-16,24,-6,16,24,-6,20,24,-10],
// 4 16 20 24 -10 16 24 -6 16 24 6 20 24 10
  [4,16,20,24,-10,16,24,-6,16,24,6,20,24,10],
// 1 16 0 24 0 20 0 0 0 -24 0 0 0 10 box4t.dat
  [1,16,0,24,0,20,0,0,0,-24,0,0,0,10, ldraw_lib__box4t(realsolid)],
// 1 16 10 0 0 1 0 0 0 1 0 0 0 1 stud.dat
  [1,16,10,0,0,1,0,0,0,1,0,0,0,1, ldraw_lib__stud(realsolid)],
// 1 16 -10 0 0 1 0 0 0 1 0 0 0 1 stud.dat
  [1,16,-10,0,0,1,0,0,0,1,0,0,0,1, ldraw_lib__stud(realsolid)],
// 0
];
module ldraw_lib__s__3004s01(step=0, col=false, unit=2/5, alt=false, line=0.2, solid=!$preview)
    makepoly(ldraw_lib__s__3004s01(solid), step=step, col=col, unit=unit, alt=alt, line=line, solid=solid);
ldraw_lib__s__3004s01(line=0.2);
// file: s/60601s01.scad
use <../../lib.scad>
use <../../p/2-4chrd.scad>
use <../../p/2-4cylo.scad>
use <../../p/box4-4a.scad>
$fa=1; $fs=0.2;
function ldraw_lib__s__60601s01(realsolid=false) = [
// 0 ~Glass for Window  1 x  2 x  2 without Front Surface
// 0 Name: s\60601s01.dat
// 0 Author: Ulrich Röder [UR]
// 0 !LDRAW_ORG Subpart UPDATE 2019-01
// 0 !LICENSE Licensed under CC BY 2.0 and CC BY 4.0 : see CAreadme.txt
// 
// 0 BFC CERTIFY CCW
  [0,"BFC","CERTIFY"],
  [0,"BFC","CCW"],
// 
// 0 !HISTORY 2019-06-28 [PTadmin] Official Update 2019-01
// 
// 
// 1 16 9.25 21.5 -7 0 0 7.25 17.5 0 0 0 4 0 box4-4a.dat
  [1,16,9.25,21.5,-7,0,0,7.25,17.5,0,0,0,4,0, ldraw_lib__box4_4a(realsolid)],
// 1 16 -9.25 21.5 -7 0 0 -7.25 17.5 0 0 0 4 0 box4-4a.dat
  [1,16,-9.25,21.5,-7,0,0,-7.25,17.5,0,0,0,4,0, ldraw_lib__box4_4a(realsolid)],
// 1 16 0 4 -7 2 0 0 0 0 -2 0 4 0 2-4cylo.dat
  [1,16,0,4,-7,2,0,0,0,0,-2,0,4,0, ldraw_lib__2_4cylo(realsolid)],
// 1 16 0 4 -7 2 0 0 0 0 -2 0 1 0 2-4chrd.dat
  [1,16,0,4,-7,2,0,0,0,0,-2,0,1,0, ldraw_lib__2_4chrd(realsolid)],
// 1 16 0 4 -3 -2 0 0 0 0 -2 0 -1 0 2-4chrd.dat
  [1,16,0,4,-3,-2,0,0,0,0,-2,0,-1,0, ldraw_lib__2_4chrd(realsolid)],
// 1 16 0 39 -7 -2 0 0 0 0 2 0 4 0 2-4cylo.dat
  [1,16,0,39,-7,-2,0,0,0,0,2,0,4,0, ldraw_lib__2_4cylo(realsolid)],
// 1 16 0 39 -7 -2 0 0 0 0 2 0 1 0 2-4chrd.dat
  [1,16,0,39,-7,-2,0,0,0,0,2,0,1,0, ldraw_lib__2_4chrd(realsolid)],
// 1 16 0 39 -3 2 0 0 0 0 2 0 -1 0 2-4chrd.dat
  [1,16,0,39,-3,2,0,0,0,0,2,0,-1,0, ldraw_lib__2_4chrd(realsolid)],
// 4 16 -2 4 -3 2 4 -3 2 39 -3 -2 39 -3
  [4,16,-2,4,-3,2,4,-3,2,39,-3,-2,39,-3],
// 2 24 2 4 -3 2 4 -7
  [2,24,2,4,-3,2,4,-7],
// 2 24 -2 4 -3 -2 4 -7
  [2,24,-2,4,-3,-2,4,-7],
// 2 24 2 39 -3 2 39 -7
  [2,24,2,39,-3,2,39,-7],
// 2 24 -2 39 -3 -2 39 -7
  [2,24,-2,39,-3,-2,39,-7],
];
module ldraw_lib__s__60601s01(step=0, col=false, unit=2/5, alt=false, line=0.2, solid=!$preview)
    makepoly(ldraw_lib__s__60601s01(solid), step=step, col=col, unit=unit, alt=alt, line=line, solid=solid);
ldraw_lib__s__60601s01(line=0.2);
// file: 3004.scad
use <../lib.scad>
use <s/3004s01.scad>
$fa=1; $fs=0.2;
function ldraw_lib__3004(realsolid=false) = [
// 0 Brick  1 x  2
// 0 Name: 3004.dat
// 0 Author: James Jessiman
// 0 !LDRAW_ORG Part UPDATE 2022-05
// 0 !LICENSE Licensed under CC BY 2.0 and CC BY 4.0 : see CAreadme.txt
// 
// 0 BFC CERTIFY CCW
  [0,"BFC","CERTIFY"],
  [0,"BFC","CCW"],
// 
// 0 !HISTORY 2001-10-26 [PTadmin] Official Update 2001-01
// 0 !HISTORY 2002-05-07 {unknown} BFC Certification
// 0 !HISTORY 2002-06-11 [PTadmin] Official Update 2002-03
// 0 !HISTORY 2007-05-07 [PTadmin] Header formatted for Contributor Agreement
// 0 !HISTORY 2008-07-01 [PTadmin] Official Update 2008-01
// 0 !HISTORY 2022-08-04 [MagFors] Using subfile
// 0 !HISTORY 2022-09-15 [PTadmin] Official Update 2022-05
// 
// 
// 1 16 0 0 0 1 0 0 0 1 0 0 0 1 s\3004s01.dat
  [1,16,0,0,0,1,0,0,0,1,0,0,0,1, ldraw_lib__s__3004s01(realsolid)],
// 4 16 -20 24 -10 20 24 -10 20 0 -10 -20 0 -10
  [4,16,-20,24,-10,20,24,-10,20,0,-10,-20,0,-10],
];
module ldraw_lib__3004(step=0, col=false, unit=2/5, alt=false, line=0.2, solid=!$preview)
    makepoly(ldraw_lib__3004(solid), step=step, col=col, unit=unit, alt=alt, line=line, solid=solid);
ldraw_lib__3004(line=0.2);
// file: 60601.scad
use <../lib.scad>
use <s/60601s01.scad>
$fa=1; $fs=0.2;
function ldraw_lib__60601(realsolid=false) = [
// 0 Glass for Window  1 x  2 x  2 without Sill
// 0 Name: 60601.dat
// 0 Author: Michael Heidemann [mikeheide]
// 0 !LDRAW_ORG Part UPDATE 2019-01
// 0 !LICENSE Licensed under CC BY 2.0 and CC BY 4.0 : see CAreadme.txt
// 
// 0 BFC CERTIFY CCW
  [0,"BFC","CERTIFY"],
  [0,"BFC","CCW"],
// 
// 0 !HISTORY 2010-12-31 [PTadmin] Official Update 2010-03
// 0 !HISTORY 2012-03-06 [gregteft] Updated to increase primitive use and correct inset for glass.
// 0 !HISTORY 2012-03-30 [PTadmin] Official Update 2012-01
// 0 !HISTORY 2018-10-02 [UR] Updated to insert Subfile
// 0 !HISTORY 2019-06-28 [PTadmin] Official Update 2019-01
// 
// 
// 1 16 0 0 0 1 -0 0 0 1 0 0 0 1 s\60601s01.dat
  [1,16,0,0,0,1,-0,0,0,1,0,0,0,1, ldraw_lib__s__60601s01(realsolid)],
// 4 16 -2 39 -7 -2 4 -7 -16.5 4 -7 -16.5 39 -7
  [4,16,-2,39,-7,-2,4,-7,-16.5,4,-7,-16.5,39,-7],
// 4 16 2 4 -7 2 39 -7 16.5 39 -7 16.5 4 -7
  [4,16,2,4,-7,2,39,-7,16.5,39,-7,16.5,4,-7],
// 4 16 2 4 -7 -2 4 -7 -2 39 -7 2 39 -7
  [4,16,2,4,-7,-2,4,-7,-2,39,-7,2,39,-7],
];
module ldraw_lib__60601(step=0, col=false, unit=2/5, alt=false, line=0.2, solid=!$preview)
    makepoly(ldraw_lib__60601(solid), step=step, col=col, unit=unit, alt=alt, line=line, solid=solid);
ldraw_lib__60601(line=0.2);
// main file
use <../lib.scad>
use <60601.scad>
$fa=1; $fs=0.2;
function ldraw_lib__86209(realsolid=false) = [
// 0 =Glass for Window  1 x  2 x  2 without Sill
// 0 Name: 86209.dat
// 0 Author: Rolf Osterthun [Rolf]
// 0 !LDRAW_ORG Part Alias UPDATE 2013-02
// 0 !LICENSE Licensed under CC BY 2.0 and CC BY 4.0 : see CAreadme.txt
// 
// 0 BFC CERTIFY CCW
  [0,"BFC","CERTIFY"],
  [0,"BFC","CCW"],
// 
// 0 !HISTORY 2013-12-23 [PTadmin] Official Update 2013-02
// 
// 
// 0 // Alias of 60601
// 
// 1 16 0 0 0 1 0 0 0 1 0 0 0 1 60601.dat
  [1,16,0,0,0,1,0,0,0,1,0,0,0,1, ldraw_lib__60601(realsolid)],
];
module ldraw_lib__86209(step=0, col=false, unit=2/5, alt=false, line=0.2, solid=!$preview)
    makepoly(ldraw_lib__86209(solid), step=step, col=col, unit=unit, alt=alt, line=line, solid=solid);
ldraw_lib__86209(line=0.2);
